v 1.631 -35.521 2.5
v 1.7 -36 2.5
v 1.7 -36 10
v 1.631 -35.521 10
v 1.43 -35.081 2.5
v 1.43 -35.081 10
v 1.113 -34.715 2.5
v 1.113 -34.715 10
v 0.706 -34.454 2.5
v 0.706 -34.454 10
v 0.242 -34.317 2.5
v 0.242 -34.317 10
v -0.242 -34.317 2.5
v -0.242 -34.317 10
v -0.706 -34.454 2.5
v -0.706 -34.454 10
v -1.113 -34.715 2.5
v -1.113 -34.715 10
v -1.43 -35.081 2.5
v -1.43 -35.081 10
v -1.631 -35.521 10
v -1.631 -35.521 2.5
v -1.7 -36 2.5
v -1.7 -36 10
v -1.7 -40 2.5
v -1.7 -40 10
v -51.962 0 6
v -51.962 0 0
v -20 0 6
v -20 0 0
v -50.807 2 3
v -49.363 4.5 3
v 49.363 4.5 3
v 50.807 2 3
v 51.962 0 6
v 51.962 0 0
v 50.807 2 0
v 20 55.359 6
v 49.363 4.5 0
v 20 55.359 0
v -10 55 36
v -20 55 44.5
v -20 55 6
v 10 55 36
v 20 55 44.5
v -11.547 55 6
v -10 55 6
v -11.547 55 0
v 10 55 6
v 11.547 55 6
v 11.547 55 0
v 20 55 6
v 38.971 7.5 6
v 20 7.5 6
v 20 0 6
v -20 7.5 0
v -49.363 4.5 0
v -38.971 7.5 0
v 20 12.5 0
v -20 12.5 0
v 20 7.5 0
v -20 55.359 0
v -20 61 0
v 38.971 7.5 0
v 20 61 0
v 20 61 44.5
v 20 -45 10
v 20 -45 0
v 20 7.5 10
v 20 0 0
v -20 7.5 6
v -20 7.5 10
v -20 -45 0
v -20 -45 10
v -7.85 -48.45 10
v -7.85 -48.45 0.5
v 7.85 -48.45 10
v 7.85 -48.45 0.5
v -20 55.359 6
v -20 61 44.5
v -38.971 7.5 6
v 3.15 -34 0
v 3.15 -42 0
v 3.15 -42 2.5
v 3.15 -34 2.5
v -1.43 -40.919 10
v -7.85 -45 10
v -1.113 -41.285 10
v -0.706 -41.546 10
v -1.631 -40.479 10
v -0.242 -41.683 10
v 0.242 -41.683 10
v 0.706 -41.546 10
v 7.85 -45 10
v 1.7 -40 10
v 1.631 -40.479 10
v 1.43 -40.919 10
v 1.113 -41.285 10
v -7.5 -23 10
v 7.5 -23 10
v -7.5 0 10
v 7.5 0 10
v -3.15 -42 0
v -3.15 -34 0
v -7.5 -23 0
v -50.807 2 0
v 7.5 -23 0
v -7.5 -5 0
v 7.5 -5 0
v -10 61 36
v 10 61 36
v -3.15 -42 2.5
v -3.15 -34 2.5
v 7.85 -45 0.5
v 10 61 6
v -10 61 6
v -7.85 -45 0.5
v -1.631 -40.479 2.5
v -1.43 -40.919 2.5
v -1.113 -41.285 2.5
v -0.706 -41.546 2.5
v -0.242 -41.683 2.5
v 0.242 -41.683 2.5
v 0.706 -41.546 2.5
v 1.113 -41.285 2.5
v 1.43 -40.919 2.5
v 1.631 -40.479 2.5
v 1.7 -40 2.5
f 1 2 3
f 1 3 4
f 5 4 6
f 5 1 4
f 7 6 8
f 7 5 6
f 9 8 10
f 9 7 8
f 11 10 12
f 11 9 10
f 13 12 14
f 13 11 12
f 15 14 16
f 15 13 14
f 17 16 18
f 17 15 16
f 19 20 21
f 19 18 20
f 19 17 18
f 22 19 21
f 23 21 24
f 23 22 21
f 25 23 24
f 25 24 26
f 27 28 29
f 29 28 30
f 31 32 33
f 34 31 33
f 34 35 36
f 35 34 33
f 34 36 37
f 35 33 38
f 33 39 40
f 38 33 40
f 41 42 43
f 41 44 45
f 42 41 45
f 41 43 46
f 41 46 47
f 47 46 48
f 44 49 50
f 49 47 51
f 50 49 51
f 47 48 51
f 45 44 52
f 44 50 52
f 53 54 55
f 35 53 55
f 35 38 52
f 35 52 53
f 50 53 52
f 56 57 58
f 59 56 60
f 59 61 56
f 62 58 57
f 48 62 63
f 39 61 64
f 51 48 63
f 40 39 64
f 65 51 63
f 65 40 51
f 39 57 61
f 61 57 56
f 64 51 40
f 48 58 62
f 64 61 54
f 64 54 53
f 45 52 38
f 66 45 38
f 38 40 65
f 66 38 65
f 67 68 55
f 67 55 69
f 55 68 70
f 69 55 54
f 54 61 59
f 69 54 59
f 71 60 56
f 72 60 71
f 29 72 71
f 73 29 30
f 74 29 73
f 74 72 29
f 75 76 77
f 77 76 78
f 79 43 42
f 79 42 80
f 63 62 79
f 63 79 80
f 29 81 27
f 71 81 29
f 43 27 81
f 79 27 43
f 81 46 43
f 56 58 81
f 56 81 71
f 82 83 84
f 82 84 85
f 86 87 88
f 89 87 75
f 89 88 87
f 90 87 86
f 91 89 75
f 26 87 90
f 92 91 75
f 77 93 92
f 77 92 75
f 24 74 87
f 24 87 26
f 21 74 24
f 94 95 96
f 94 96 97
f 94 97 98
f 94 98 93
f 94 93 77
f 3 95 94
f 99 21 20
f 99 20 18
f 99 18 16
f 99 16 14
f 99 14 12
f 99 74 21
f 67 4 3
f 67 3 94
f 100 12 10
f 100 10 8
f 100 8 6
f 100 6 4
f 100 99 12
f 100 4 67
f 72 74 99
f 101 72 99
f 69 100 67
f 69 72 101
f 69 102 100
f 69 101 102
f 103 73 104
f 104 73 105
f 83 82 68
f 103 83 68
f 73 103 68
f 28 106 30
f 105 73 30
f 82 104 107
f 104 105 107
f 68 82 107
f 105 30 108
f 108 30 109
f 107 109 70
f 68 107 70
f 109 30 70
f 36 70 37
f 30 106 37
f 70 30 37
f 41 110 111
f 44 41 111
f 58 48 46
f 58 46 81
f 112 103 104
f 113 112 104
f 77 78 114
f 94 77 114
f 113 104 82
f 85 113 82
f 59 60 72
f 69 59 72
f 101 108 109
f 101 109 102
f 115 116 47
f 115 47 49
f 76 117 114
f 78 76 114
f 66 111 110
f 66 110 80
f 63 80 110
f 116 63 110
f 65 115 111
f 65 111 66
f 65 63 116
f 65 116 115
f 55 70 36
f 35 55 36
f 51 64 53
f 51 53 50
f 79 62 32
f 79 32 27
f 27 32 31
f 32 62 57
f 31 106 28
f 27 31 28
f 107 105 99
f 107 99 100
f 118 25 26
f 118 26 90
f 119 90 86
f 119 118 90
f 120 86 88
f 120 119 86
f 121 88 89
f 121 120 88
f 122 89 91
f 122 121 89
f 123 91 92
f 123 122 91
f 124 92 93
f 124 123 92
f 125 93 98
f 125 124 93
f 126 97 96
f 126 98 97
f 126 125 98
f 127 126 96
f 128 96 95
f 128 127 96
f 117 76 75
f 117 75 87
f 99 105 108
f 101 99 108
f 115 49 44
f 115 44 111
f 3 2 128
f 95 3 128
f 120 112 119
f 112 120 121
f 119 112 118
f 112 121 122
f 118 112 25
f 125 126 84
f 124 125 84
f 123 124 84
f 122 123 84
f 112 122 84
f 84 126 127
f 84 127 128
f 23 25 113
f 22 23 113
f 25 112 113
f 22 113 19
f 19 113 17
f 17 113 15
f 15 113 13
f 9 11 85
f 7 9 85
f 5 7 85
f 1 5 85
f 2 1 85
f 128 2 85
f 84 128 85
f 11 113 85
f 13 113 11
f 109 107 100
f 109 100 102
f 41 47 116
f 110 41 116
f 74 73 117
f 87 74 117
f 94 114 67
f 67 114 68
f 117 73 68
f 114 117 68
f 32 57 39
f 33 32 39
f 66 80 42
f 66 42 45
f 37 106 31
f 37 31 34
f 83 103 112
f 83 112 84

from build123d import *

# Parameters (mm, degrees)
BOX051_W                   = 220
BOX051_H                   = 2.5
BOX051_DEPTH               = 3
EXTRUDE020_DEPTH           = 10
BOX052_W                   = 220
BOX052_H                   = 113
BOX052_DEPTH               = 8
BOX050_W                   = 32
BOX050_H                   = 6
BOX050_DEPTH               = 6
PRISM006_DEPTH             = 6
PRISM006_PLACEMENT_ANGLE   = 30
PRISM007_DEPTH             = 6
PRISM007_PLACEMENT_ANGLE   = 30
BOX055_W                   = 6.3
BOX055_H                   = 8
BOX055_DEPTH               = 2.5
EXTRUDE021_DEPTH           = 12
BOX054_W                   = 15.7
BOX054_H                   = 3.45
BOX054_DEPTH               = 9.5
BOX053_W                   = 15
BOX053_H                   = 22
BOX053_DEPTH               = 10
EXTRUDE022_DEPTH           = 12
BOX038_W                   = 12.5
BOX038_H                   = 46
BOX038_DEPTH               = 10
BOX046_W                   = 220
BOX046_H                   = 2.5
BOX046_DEPTH               = 3
BOX045_W                   = 30
BOX045_H                   = 7.5
BOX045_DEPTH               = 10
BOX047_W                   = 50
BOX047_H                   = 10
BOX047_DEPTH               = 10
BOX042_W                   = 12.5
BOX042_H                   = 7.5
BOX042_DEPTH               = 12
BOX043_W                   = 12.5
BOX043_H                   = 7.5
BOX043_DEPTH               = 12
CYLINDER004_R              = 1.7
CYLINDER004_DEPTH          = 30
BOX041_W                   = 15
BOX041_H                   = 70
BOX041_DEPTH               = 6
BOX044_W                   = 40
BOX044_H                   = 51
BOX044_DEPTH               = 6
EXTRUDE018_DEPTH           = 40
BOX040_W                   = 12.5
BOX040_H                   = 46
BOX040_DEPTH               = 10
BOX039_W                   = 12.5
BOX039_H                   = 46
BOX039_DEPTH               = 10
EXTRUDE019_DEPTH           = 40
EXTRUDE019_PLACEMENT_ANGLE = 180
BOX036_W                   = 220
BOX036_H                   = 2.5
BOX036_DEPTH               = 3
BOX037_W                   = 30
BOX037_H                   = 7.5
BOX037_DEPTH               = 10
BOX035_W                   = 50
BOX035_H                   = 10
BOX035_DEPTH               = 10
BOX009_W                   = 12.5
BOX009_H                   = 7.5
BOX009_DEPTH               = 12
BOX010_W                   = 12.5
BOX010_H                   = 7.5
BOX010_DEPTH               = 12
CYLINDER_R                 = 1.7
CYLINDER_DEPTH             = 30
BOX007_W                   = 15
BOX007_H                   = 70
BOX007_DEPTH               = 6
BOX006_W                   = 40
BOX006_H                   = 51
BOX006_DEPTH               = 6
BOX048_W                   = 20
BOX048_H                   = 6
BOX048_DEPTH               = 30
BOX049_W                   = 40
BOX049_H                   = 6
BOX049_DEPTH               = 44.5


with BuildPart() as corte_canaleta004:
    # Box051 → Box051 (new body)
    with BuildSketch(Plane(origin=(-110, 2, 0), x_dir=(1, 0, 0), z_dir=(0, 0, 1))):
        with Locations((110, 1.25)):
            Rectangle(BOX051_W, BOX051_H)
    extrude(amount=BOX051_DEPTH)


with BuildPart() as extrude020:
    # Sketch017 → Extrude020 (new body)
    with BuildSketch(Plane.XY):
        Polygon((-95, 0), (95, 0), (85, 61), (-85, 61), align=None)
    extrude(amount=EXTRUDE020_DEPTH)


with BuildPart() as molde_cortador003:
    # Box052 → Box052 (new body)
    with BuildSketch(Plane(origin=(-110, -15, 0), x_dir=(1, 0, 0), z_dir=(0, 0, 1))):
        with Locations((110, 56.5)):
            Rectangle(BOX052_W, BOX052_H)
    extrude(amount=BOX052_DEPTH)

    # Cut004035: cut Extrude020
    add(extrude020.part, mode=Mode.SUBTRACT)


with BuildPart() as cube045:
    # Box050 → Box050 (new body)
    with BuildSketch(Plane(origin=(-16, 55, 0), x_dir=(1, 0, 0), z_dir=(0, 0, 1))):
        with Locations((16, 3)):
            Rectangle(BOX050_W, BOX050_H)
    extrude(amount=BOX050_DEPTH)


with BuildPart() as prism006:
    # Prism006 → Prism006 (new body)
    with BuildSketch(Plane.XY):
        Polygon((45, 0), (-22.5, 38.971143), (-22.5, -38.971143), align=None)
    extrude(amount=PRISM006_DEPTH)


with BuildPart() as prism006_1:
    # Prism006 placement: moved
    add(prism006.part.moved(Location((0, 23, 0))).rotate(Axis((0, 23, 0), (0, 0, -1)), PRISM006_PLACEMENT_ANGLE))


with BuildPart() as base_triangulo_con_canaleta33:
    # Prism007 → Prism007 (new body)
    with BuildSketch(Plane.XY):
        Polygon((60, 0), (-30, 51.961524), (-30, -51.961524), align=None)
    extrude(amount=PRISM007_DEPTH)


with BuildPart() as base_triangulo_con_canaleta33_1:
    # Prism007 placement: moved
    add(base_triangulo_con_canaleta33.part.moved(Location((0, 23, 0))).rotate(Axis((0, 23, 0), (0, 0, -1)), PRISM007_PLACEMENT_ANGLE))

    # Cut004032: cut Prism006
    add(prism006_1.part, mode=Mode.SUBTRACT)


with BuildPart() as base_triangulo_con_canaleta33_2:
    # Cut004032 placement: moved
    add(base_triangulo_con_canaleta33_1.part.moved(Location((0, 7, 0))))

    # Fusion004009004002006: union Cube045
    add(cube045.part)

    # Cut004034: cut molde_cortador003
    add(molde_cortador003.part, mode=Mode.SUBTRACT)

    # Cut004033: cut corte_canaleta004
    add(corte_canaleta004.part, mode=Mode.SUBTRACT)


with BuildPart() as cube049:
    # Box055 → Box055 (new body)
    with BuildSketch(Plane(origin=(-3.15, -42, 0), x_dir=(1, 0, 0), z_dir=(0, 0, 1))):
        with Locations((3.15, 4)):
            Rectangle(BOX055_W, BOX055_H)
    extrude(amount=BOX055_DEPTH)


with BuildPart() as extrude021:
    # Sketch018 (on Face24 of Fusion004009004002007001) → Extrude021 (new body)
    with BuildSketch(Plane.XY.offset(10)):
        with BuildLine():
            ThreePointArc((1.7, -36), (0, -34.3), (-1.7, -36))
            Line((-1.7, -36), (-1.7, -40))
            ThreePointArc((-1.7, -40), (0, -41.7), (1.7, -40))
            Line((1.7, -36), (1.7, -40))
        make_face()
    extrude(amount=EXTRUDE021_DEPTH)


with BuildPart() as extrude021_1:
    # Extrude021 placement: moved
    add(extrude021.part.moved(Location((0, 0, -11))))


with BuildPart() as cube048:
    # Box054 → Box054 (new body)
    with BuildSketch(Plane(origin=(-7.85, -48.45, 0.5), x_dir=(1, 0, 0), z_dir=(0, 0, 1))):
        with Locations((7.85, 1.725)):
            Rectangle(BOX054_W, BOX054_H)
    extrude(amount=BOX054_DEPTH)


with BuildPart() as cut004038:
    # Box053 → Box053 (new body)
    with BuildSketch(Plane(origin=(-7.5, -45, 0), x_dir=(1, 0, 0), z_dir=(0, 0, 1))):
        with Locations((7.5, 11)):
            Rectangle(BOX053_W, BOX053_H)
    extrude(amount=BOX053_DEPTH)

    # Fusion004009004002007002: union Cube048
    add(cube048.part)

    # Cut004036: cut Extrude021
    add(extrude021_1.part, mode=Mode.SUBTRACT)

    # Cut004038: cut Cube049
    add(cube049.part, mode=Mode.SUBTRACT)


with BuildPart() as extrude022:
    # Sketch019 (on Face24 of Fusion004009004002007003) → Extrude022 (new body)
    with BuildSketch(Plane.XY.offset(10)):
        with BuildLine():
            ThreePointArc((1.7, -36), (0, -34.3), (-1.7, -36))
            Line((-1.7, -36), (-1.7, -40))
            ThreePointArc((-1.7, -40), (0, -41.7), (1.7, -40))
            Line((1.7, -36), (1.7, -40))
        make_face()
    extrude(amount=EXTRUDE022_DEPTH)


with BuildPart() as extrude022_1:
    # Extrude022 placement: moved
    add(extrude022.part.moved(Location((0, 0, -11))))


with BuildPart() as cube034:
    # Box038 → Box038 (new body)
    with BuildSketch(Plane(origin=(-20, -45, 0), x_dir=(1, 0, 0), z_dir=(0, 0, 1))):
        with Locations((6.25, 23)):
            Rectangle(BOX038_W, BOX038_H)
    extrude(amount=BOX038_DEPTH)


with BuildPart() as corte_canaleta003:
    # Box046 → Box046 (new body)
    with BuildSketch(Plane(origin=(-110, 2, 0), x_dir=(1, 0, 0), z_dir=(0, 0, 1))):
        with Locations((110, 1.25)):
            Rectangle(BOX046_W, BOX046_H)
    extrude(amount=BOX046_DEPTH)


with BuildPart() as cube041:
    # Box045 → Box045 (new body)
    with BuildSketch(Plane(origin=(-14, 0, 0), x_dir=(1, 0, 0), z_dir=(0, 0, 1))):
        with Locations((15, 3.75)):
            Rectangle(BOX045_W, BOX045_H)
    extrude(amount=BOX045_DEPTH)


with BuildPart() as cube042:
    # Box047 → Box047 (new body)
    with BuildSketch(Plane(origin=(-22, -1, -10), x_dir=(1, 0, 0), z_dir=(0, 0, 1))):
        with Locations((25, 5)):
            Rectangle(BOX047_W, BOX047_H)
    extrude(amount=BOX047_DEPTH)


with BuildPart() as cube038:
    # Box042 → Box042 (new body)
    with BuildSketch(Plane(origin=(7.5, 0, 13), x_dir=(1, 0, 0), z_dir=(0, 0, 1))):
        with Locations((6.25, 3.75)):
            Rectangle(BOX042_W, BOX042_H)
    extrude(amount=BOX042_DEPTH)


with BuildPart() as cube039:
    # Box043 → Box043 (new body)
    with BuildSketch(Plane(origin=(-20, 0, 13), x_dir=(1, 0, 0), z_dir=(0, 0, 1))):
        with Locations((6.25, 3.75)):
            Rectangle(BOX043_W, BOX043_H)
    extrude(amount=BOX043_DEPTH)


with BuildPart() as cylinder004:
    # Cylinder004 → Cylinder004 (new body)
    with BuildSketch(Plane(origin=(0, 7, 0), x_dir=(1, 0, 0), z_dir=(0, 0, 1))):
        Circle(CYLINDER004_R)
    extrude(amount=CYLINDER004_DEPTH)


with BuildPart() as cube037:
    # Box041 → Box041 (new body)
    with BuildSketch(Plane(origin=(12.5, 22, 20), x_dir=(1, 0, 0), z_dir=(0, 0, 1))):
        with Locations((7.5, 35)):
            Rectangle(BOX041_W, BOX041_H)
    extrude(amount=BOX041_DEPTH)


with BuildPart() as cut004029:
    # Box044 → Box044 (new body)
    with BuildSketch(Plane.XY.offset(20)):
        with Locations((20, 25.5)):
            Rectangle(BOX044_W, BOX044_H)
    extrude(amount=BOX044_DEPTH)

    # Cut004028: cut Cube037
    add(cube037.part, mode=Mode.SUBTRACT)


with BuildPart() as cut004029_1:
    # Cut004028 placement: moved
    add(cut004029.part.moved(Location((-20, 0, -1))))

    # Cut004027: cut Cylinder004
    add(cylinder004.part, mode=Mode.SUBTRACT)


with BuildPart() as cut004029_2:
    # Cut004027 placement: moved
    add(cut004029_1.part.moved(Location((0, -45, 0))))

    # Fusion004009004002003: union Cube038, Cube039
    add(cube038.part)
    add(cube039.part)


with BuildPart() as cut004029_3:
    # Fusion004009004002003 placement: moved
    add(cut004029_2.part.moved(Location((0, 0, -15))))

    # Cut004030: cut Cube042
    add(cube042.part, mode=Mode.SUBTRACT)

    # Fusion004009004002004: union Cube041
    add(cube041.part)

    # Cut004029: cut corte_canaleta003
    add(corte_canaleta003.part, mode=Mode.SUBTRACT)


with BuildPart() as extrude018:
    # Sketch015 (on Face1 of Box038) → Extrude018 (new body)
    with BuildSketch(Plane(origin=(-20, -45, 0), x_dir=(0, -1, 0), z_dir=(-1, 0, 0))):
        Polygon((-52.5, 10), (-52.5, 0), (-57.5, 0), align=None)
    extrude(amount=EXTRUDE018_DEPTH)


with BuildPart() as extrude018_1:
    # Extrude018 placement: moved
    add(extrude018.part.moved(Location((40, 0, 0))))


with BuildPart() as cube036:
    # Box040 → Box040 (new body)
    with BuildSketch(Plane(origin=(-20, -45, 0), x_dir=(1, 0, 0), z_dir=(0, 0, 1))):
        with Locations((6.25, 23)):
            Rectangle(BOX040_W, BOX040_H)
    extrude(amount=BOX040_DEPTH)


with BuildPart() as cube035:
    # Box039 → Box039 (new body)
    with BuildSketch(Plane(origin=(7.5, -45, 0), x_dir=(1, 0, 0), z_dir=(0, 0, 1))):
        with Locations((6.25, 23)):
            Rectangle(BOX039_W, BOX039_H)
    extrude(amount=BOX039_DEPTH)


with BuildPart() as extrude019:
    # Sketch016 (on Face1 of Box040) → Extrude019 (new body)
    with BuildSketch(Plane(origin=(-20, -45, 0), x_dir=(0, -1, 0), z_dir=(-1, 0, 0))):
        Polygon((-52.5, 10), (-52.5, 0), (-57.5, 0), align=None)
    extrude(amount=EXTRUDE019_DEPTH)


with BuildPart() as extrude019_1:
    # Extrude019 placement: moved
    add(extrude019.part.moved(Location((-40, 7.5, 0))).rotate(Axis((-40, 7.5, 0), (0, 0, 1)), EXTRUDE019_PLACEMENT_ANGLE))


with BuildPart() as corte_canaleta002:
    # Box036 → Box036 (new body)
    with BuildSketch(Plane(origin=(-110, 2, 0), x_dir=(1, 0, 0), z_dir=(0, 0, 1))):
        with Locations((110, 1.25)):
            Rectangle(BOX036_W, BOX036_H)
    extrude(amount=BOX036_DEPTH)


with BuildPart() as cube033:
    # Box037 → Box037 (new body)
    with BuildSketch(Plane(origin=(-14, 0, 0), x_dir=(1, 0, 0), z_dir=(0, 0, 1))):
        with Locations((15, 3.75)):
            Rectangle(BOX037_W, BOX037_H)
    extrude(amount=BOX037_DEPTH)


with BuildPart() as cube032:
    # Box035 → Box035 (new body)
    with BuildSketch(Plane(origin=(-22, -1, -10), x_dir=(1, 0, 0), z_dir=(0, 0, 1))):
        with Locations((25, 5)):
            Rectangle(BOX035_W, BOX035_H)
    extrude(amount=BOX035_DEPTH)


with BuildPart() as cube008:
    # Box009 → Box009 (new body)
    with BuildSketch(Plane(origin=(7.5, 0, 13), x_dir=(1, 0, 0), z_dir=(0, 0, 1))):
        with Locations((6.25, 3.75)):
            Rectangle(BOX009_W, BOX009_H)
    extrude(amount=BOX009_DEPTH)


with BuildPart() as cube009:
    # Box010 → Box010 (new body)
    with BuildSketch(Plane(origin=(-20, 0, 13), x_dir=(1, 0, 0), z_dir=(0, 0, 1))):
        with Locations((6.25, 3.75)):
            Rectangle(BOX010_W, BOX010_H)
    extrude(amount=BOX010_DEPTH)


with BuildPart() as cylinder:
    # Cylinder → Cylinder (new body)
    with BuildSketch(Plane(origin=(0, 7, 0), x_dir=(1, 0, 0), z_dir=(0, 0, 1))):
        Circle(CYLINDER_R)
    extrude(amount=CYLINDER_DEPTH)


with BuildPart() as cube007:
    # Box007 → Box007 (new body)
    with BuildSketch(Plane(origin=(12.5, 22, 20), x_dir=(1, 0, 0), z_dir=(0, 0, 1))):
        with Locations((7.5, 35)):
            Rectangle(BOX007_W, BOX007_H)
    extrude(amount=BOX007_DEPTH)


with BuildPart() as parte_frontal_con_refuerzo34:
    # Box006 → Box006 (new body)
    with BuildSketch(Plane.XY.offset(20)):
        with Locations((20, 25.5)):
            Rectangle(BOX006_W, BOX006_H)
    extrude(amount=BOX006_DEPTH)

    # Cut004005: cut Cube007
    add(cube007.part, mode=Mode.SUBTRACT)


with BuildPart() as parte_frontal_con_refuerzo34_1:
    # Cut004005 placement: moved
    add(parte_frontal_con_refuerzo34.part.moved(Location((-20, 0, -1))))

    # Cut004006: cut Cylinder
    add(cylinder.part, mode=Mode.SUBTRACT)


with BuildPart() as parte_frontal_con_refuerzo34_2:
    # Cut004006 placement: moved
    add(parte_frontal_con_refuerzo34_1.part.moved(Location((0, -45, 0))))

    # Fusion004002: union Cube008, Cube009
    add(cube008.part)
    add(cube009.part)


with BuildPart() as parte_frontal_con_refuerzo34_3:
    # Fusion004002 placement: moved
    add(parte_frontal_con_refuerzo34_2.part.moved(Location((0, 0, -15))))

    # Cut004025: cut Cube032
    add(cube032.part, mode=Mode.SUBTRACT)

    # Fusion004009004002002: union Cube033
    add(cube033.part)

    # Cut004026: cut corte_canaleta002
    add(corte_canaleta002.part, mode=Mode.SUBTRACT)

    # Fusion004009004002005: union Cube034, Cut004029, Extrude018, Cube036, Cube035, Extrude019
    add(cube034.part)
    add(cut004029_3.part)
    add(extrude018_1.part)
    add(cube036.part)
    add(cube035.part)
    add(extrude019_1.part)

    # Cut004037: cut Extrude022
    add(extrude022_1.part, mode=Mode.SUBTRACT)

    # Fusion004009004002007004: union Cut004038
    add(cut004038.part)


with BuildPart() as cube043:
    # Box048 → Box048 (new body)
    with BuildSketch(Plane(origin=(-10, 55, 6), x_dir=(1, 0, 0), z_dir=(0, 0, 1))):
        with Locations((10, 3)):
            Rectangle(BOX048_W, BOX048_H)
    extrude(amount=BOX048_DEPTH)


with BuildPart() as soporte_3_4_sin_refinar:
    # Box049 → Box049 (new body)
    with BuildSketch(Plane(origin=(-20, 55, 0), x_dir=(1, 0, 0), z_dir=(0, 0, 1))):
        with Locations((20, 3)):
            Rectangle(BOX049_W, BOX049_H)
    extrude(amount=BOX049_DEPTH)

    # Cut004031: cut Cube043
    add(cube043.part, mode=Mode.SUBTRACT)

    # Fusion004009004002007005: union base_triangulo_con_canaleta33, parte_frontal_con_refuerzo34
    add(base_triangulo_con_canaleta33_2.part)
    add(parte_frontal_con_refuerzo34_3.part)


solid = soporte_3_4_sin_refinar.part
